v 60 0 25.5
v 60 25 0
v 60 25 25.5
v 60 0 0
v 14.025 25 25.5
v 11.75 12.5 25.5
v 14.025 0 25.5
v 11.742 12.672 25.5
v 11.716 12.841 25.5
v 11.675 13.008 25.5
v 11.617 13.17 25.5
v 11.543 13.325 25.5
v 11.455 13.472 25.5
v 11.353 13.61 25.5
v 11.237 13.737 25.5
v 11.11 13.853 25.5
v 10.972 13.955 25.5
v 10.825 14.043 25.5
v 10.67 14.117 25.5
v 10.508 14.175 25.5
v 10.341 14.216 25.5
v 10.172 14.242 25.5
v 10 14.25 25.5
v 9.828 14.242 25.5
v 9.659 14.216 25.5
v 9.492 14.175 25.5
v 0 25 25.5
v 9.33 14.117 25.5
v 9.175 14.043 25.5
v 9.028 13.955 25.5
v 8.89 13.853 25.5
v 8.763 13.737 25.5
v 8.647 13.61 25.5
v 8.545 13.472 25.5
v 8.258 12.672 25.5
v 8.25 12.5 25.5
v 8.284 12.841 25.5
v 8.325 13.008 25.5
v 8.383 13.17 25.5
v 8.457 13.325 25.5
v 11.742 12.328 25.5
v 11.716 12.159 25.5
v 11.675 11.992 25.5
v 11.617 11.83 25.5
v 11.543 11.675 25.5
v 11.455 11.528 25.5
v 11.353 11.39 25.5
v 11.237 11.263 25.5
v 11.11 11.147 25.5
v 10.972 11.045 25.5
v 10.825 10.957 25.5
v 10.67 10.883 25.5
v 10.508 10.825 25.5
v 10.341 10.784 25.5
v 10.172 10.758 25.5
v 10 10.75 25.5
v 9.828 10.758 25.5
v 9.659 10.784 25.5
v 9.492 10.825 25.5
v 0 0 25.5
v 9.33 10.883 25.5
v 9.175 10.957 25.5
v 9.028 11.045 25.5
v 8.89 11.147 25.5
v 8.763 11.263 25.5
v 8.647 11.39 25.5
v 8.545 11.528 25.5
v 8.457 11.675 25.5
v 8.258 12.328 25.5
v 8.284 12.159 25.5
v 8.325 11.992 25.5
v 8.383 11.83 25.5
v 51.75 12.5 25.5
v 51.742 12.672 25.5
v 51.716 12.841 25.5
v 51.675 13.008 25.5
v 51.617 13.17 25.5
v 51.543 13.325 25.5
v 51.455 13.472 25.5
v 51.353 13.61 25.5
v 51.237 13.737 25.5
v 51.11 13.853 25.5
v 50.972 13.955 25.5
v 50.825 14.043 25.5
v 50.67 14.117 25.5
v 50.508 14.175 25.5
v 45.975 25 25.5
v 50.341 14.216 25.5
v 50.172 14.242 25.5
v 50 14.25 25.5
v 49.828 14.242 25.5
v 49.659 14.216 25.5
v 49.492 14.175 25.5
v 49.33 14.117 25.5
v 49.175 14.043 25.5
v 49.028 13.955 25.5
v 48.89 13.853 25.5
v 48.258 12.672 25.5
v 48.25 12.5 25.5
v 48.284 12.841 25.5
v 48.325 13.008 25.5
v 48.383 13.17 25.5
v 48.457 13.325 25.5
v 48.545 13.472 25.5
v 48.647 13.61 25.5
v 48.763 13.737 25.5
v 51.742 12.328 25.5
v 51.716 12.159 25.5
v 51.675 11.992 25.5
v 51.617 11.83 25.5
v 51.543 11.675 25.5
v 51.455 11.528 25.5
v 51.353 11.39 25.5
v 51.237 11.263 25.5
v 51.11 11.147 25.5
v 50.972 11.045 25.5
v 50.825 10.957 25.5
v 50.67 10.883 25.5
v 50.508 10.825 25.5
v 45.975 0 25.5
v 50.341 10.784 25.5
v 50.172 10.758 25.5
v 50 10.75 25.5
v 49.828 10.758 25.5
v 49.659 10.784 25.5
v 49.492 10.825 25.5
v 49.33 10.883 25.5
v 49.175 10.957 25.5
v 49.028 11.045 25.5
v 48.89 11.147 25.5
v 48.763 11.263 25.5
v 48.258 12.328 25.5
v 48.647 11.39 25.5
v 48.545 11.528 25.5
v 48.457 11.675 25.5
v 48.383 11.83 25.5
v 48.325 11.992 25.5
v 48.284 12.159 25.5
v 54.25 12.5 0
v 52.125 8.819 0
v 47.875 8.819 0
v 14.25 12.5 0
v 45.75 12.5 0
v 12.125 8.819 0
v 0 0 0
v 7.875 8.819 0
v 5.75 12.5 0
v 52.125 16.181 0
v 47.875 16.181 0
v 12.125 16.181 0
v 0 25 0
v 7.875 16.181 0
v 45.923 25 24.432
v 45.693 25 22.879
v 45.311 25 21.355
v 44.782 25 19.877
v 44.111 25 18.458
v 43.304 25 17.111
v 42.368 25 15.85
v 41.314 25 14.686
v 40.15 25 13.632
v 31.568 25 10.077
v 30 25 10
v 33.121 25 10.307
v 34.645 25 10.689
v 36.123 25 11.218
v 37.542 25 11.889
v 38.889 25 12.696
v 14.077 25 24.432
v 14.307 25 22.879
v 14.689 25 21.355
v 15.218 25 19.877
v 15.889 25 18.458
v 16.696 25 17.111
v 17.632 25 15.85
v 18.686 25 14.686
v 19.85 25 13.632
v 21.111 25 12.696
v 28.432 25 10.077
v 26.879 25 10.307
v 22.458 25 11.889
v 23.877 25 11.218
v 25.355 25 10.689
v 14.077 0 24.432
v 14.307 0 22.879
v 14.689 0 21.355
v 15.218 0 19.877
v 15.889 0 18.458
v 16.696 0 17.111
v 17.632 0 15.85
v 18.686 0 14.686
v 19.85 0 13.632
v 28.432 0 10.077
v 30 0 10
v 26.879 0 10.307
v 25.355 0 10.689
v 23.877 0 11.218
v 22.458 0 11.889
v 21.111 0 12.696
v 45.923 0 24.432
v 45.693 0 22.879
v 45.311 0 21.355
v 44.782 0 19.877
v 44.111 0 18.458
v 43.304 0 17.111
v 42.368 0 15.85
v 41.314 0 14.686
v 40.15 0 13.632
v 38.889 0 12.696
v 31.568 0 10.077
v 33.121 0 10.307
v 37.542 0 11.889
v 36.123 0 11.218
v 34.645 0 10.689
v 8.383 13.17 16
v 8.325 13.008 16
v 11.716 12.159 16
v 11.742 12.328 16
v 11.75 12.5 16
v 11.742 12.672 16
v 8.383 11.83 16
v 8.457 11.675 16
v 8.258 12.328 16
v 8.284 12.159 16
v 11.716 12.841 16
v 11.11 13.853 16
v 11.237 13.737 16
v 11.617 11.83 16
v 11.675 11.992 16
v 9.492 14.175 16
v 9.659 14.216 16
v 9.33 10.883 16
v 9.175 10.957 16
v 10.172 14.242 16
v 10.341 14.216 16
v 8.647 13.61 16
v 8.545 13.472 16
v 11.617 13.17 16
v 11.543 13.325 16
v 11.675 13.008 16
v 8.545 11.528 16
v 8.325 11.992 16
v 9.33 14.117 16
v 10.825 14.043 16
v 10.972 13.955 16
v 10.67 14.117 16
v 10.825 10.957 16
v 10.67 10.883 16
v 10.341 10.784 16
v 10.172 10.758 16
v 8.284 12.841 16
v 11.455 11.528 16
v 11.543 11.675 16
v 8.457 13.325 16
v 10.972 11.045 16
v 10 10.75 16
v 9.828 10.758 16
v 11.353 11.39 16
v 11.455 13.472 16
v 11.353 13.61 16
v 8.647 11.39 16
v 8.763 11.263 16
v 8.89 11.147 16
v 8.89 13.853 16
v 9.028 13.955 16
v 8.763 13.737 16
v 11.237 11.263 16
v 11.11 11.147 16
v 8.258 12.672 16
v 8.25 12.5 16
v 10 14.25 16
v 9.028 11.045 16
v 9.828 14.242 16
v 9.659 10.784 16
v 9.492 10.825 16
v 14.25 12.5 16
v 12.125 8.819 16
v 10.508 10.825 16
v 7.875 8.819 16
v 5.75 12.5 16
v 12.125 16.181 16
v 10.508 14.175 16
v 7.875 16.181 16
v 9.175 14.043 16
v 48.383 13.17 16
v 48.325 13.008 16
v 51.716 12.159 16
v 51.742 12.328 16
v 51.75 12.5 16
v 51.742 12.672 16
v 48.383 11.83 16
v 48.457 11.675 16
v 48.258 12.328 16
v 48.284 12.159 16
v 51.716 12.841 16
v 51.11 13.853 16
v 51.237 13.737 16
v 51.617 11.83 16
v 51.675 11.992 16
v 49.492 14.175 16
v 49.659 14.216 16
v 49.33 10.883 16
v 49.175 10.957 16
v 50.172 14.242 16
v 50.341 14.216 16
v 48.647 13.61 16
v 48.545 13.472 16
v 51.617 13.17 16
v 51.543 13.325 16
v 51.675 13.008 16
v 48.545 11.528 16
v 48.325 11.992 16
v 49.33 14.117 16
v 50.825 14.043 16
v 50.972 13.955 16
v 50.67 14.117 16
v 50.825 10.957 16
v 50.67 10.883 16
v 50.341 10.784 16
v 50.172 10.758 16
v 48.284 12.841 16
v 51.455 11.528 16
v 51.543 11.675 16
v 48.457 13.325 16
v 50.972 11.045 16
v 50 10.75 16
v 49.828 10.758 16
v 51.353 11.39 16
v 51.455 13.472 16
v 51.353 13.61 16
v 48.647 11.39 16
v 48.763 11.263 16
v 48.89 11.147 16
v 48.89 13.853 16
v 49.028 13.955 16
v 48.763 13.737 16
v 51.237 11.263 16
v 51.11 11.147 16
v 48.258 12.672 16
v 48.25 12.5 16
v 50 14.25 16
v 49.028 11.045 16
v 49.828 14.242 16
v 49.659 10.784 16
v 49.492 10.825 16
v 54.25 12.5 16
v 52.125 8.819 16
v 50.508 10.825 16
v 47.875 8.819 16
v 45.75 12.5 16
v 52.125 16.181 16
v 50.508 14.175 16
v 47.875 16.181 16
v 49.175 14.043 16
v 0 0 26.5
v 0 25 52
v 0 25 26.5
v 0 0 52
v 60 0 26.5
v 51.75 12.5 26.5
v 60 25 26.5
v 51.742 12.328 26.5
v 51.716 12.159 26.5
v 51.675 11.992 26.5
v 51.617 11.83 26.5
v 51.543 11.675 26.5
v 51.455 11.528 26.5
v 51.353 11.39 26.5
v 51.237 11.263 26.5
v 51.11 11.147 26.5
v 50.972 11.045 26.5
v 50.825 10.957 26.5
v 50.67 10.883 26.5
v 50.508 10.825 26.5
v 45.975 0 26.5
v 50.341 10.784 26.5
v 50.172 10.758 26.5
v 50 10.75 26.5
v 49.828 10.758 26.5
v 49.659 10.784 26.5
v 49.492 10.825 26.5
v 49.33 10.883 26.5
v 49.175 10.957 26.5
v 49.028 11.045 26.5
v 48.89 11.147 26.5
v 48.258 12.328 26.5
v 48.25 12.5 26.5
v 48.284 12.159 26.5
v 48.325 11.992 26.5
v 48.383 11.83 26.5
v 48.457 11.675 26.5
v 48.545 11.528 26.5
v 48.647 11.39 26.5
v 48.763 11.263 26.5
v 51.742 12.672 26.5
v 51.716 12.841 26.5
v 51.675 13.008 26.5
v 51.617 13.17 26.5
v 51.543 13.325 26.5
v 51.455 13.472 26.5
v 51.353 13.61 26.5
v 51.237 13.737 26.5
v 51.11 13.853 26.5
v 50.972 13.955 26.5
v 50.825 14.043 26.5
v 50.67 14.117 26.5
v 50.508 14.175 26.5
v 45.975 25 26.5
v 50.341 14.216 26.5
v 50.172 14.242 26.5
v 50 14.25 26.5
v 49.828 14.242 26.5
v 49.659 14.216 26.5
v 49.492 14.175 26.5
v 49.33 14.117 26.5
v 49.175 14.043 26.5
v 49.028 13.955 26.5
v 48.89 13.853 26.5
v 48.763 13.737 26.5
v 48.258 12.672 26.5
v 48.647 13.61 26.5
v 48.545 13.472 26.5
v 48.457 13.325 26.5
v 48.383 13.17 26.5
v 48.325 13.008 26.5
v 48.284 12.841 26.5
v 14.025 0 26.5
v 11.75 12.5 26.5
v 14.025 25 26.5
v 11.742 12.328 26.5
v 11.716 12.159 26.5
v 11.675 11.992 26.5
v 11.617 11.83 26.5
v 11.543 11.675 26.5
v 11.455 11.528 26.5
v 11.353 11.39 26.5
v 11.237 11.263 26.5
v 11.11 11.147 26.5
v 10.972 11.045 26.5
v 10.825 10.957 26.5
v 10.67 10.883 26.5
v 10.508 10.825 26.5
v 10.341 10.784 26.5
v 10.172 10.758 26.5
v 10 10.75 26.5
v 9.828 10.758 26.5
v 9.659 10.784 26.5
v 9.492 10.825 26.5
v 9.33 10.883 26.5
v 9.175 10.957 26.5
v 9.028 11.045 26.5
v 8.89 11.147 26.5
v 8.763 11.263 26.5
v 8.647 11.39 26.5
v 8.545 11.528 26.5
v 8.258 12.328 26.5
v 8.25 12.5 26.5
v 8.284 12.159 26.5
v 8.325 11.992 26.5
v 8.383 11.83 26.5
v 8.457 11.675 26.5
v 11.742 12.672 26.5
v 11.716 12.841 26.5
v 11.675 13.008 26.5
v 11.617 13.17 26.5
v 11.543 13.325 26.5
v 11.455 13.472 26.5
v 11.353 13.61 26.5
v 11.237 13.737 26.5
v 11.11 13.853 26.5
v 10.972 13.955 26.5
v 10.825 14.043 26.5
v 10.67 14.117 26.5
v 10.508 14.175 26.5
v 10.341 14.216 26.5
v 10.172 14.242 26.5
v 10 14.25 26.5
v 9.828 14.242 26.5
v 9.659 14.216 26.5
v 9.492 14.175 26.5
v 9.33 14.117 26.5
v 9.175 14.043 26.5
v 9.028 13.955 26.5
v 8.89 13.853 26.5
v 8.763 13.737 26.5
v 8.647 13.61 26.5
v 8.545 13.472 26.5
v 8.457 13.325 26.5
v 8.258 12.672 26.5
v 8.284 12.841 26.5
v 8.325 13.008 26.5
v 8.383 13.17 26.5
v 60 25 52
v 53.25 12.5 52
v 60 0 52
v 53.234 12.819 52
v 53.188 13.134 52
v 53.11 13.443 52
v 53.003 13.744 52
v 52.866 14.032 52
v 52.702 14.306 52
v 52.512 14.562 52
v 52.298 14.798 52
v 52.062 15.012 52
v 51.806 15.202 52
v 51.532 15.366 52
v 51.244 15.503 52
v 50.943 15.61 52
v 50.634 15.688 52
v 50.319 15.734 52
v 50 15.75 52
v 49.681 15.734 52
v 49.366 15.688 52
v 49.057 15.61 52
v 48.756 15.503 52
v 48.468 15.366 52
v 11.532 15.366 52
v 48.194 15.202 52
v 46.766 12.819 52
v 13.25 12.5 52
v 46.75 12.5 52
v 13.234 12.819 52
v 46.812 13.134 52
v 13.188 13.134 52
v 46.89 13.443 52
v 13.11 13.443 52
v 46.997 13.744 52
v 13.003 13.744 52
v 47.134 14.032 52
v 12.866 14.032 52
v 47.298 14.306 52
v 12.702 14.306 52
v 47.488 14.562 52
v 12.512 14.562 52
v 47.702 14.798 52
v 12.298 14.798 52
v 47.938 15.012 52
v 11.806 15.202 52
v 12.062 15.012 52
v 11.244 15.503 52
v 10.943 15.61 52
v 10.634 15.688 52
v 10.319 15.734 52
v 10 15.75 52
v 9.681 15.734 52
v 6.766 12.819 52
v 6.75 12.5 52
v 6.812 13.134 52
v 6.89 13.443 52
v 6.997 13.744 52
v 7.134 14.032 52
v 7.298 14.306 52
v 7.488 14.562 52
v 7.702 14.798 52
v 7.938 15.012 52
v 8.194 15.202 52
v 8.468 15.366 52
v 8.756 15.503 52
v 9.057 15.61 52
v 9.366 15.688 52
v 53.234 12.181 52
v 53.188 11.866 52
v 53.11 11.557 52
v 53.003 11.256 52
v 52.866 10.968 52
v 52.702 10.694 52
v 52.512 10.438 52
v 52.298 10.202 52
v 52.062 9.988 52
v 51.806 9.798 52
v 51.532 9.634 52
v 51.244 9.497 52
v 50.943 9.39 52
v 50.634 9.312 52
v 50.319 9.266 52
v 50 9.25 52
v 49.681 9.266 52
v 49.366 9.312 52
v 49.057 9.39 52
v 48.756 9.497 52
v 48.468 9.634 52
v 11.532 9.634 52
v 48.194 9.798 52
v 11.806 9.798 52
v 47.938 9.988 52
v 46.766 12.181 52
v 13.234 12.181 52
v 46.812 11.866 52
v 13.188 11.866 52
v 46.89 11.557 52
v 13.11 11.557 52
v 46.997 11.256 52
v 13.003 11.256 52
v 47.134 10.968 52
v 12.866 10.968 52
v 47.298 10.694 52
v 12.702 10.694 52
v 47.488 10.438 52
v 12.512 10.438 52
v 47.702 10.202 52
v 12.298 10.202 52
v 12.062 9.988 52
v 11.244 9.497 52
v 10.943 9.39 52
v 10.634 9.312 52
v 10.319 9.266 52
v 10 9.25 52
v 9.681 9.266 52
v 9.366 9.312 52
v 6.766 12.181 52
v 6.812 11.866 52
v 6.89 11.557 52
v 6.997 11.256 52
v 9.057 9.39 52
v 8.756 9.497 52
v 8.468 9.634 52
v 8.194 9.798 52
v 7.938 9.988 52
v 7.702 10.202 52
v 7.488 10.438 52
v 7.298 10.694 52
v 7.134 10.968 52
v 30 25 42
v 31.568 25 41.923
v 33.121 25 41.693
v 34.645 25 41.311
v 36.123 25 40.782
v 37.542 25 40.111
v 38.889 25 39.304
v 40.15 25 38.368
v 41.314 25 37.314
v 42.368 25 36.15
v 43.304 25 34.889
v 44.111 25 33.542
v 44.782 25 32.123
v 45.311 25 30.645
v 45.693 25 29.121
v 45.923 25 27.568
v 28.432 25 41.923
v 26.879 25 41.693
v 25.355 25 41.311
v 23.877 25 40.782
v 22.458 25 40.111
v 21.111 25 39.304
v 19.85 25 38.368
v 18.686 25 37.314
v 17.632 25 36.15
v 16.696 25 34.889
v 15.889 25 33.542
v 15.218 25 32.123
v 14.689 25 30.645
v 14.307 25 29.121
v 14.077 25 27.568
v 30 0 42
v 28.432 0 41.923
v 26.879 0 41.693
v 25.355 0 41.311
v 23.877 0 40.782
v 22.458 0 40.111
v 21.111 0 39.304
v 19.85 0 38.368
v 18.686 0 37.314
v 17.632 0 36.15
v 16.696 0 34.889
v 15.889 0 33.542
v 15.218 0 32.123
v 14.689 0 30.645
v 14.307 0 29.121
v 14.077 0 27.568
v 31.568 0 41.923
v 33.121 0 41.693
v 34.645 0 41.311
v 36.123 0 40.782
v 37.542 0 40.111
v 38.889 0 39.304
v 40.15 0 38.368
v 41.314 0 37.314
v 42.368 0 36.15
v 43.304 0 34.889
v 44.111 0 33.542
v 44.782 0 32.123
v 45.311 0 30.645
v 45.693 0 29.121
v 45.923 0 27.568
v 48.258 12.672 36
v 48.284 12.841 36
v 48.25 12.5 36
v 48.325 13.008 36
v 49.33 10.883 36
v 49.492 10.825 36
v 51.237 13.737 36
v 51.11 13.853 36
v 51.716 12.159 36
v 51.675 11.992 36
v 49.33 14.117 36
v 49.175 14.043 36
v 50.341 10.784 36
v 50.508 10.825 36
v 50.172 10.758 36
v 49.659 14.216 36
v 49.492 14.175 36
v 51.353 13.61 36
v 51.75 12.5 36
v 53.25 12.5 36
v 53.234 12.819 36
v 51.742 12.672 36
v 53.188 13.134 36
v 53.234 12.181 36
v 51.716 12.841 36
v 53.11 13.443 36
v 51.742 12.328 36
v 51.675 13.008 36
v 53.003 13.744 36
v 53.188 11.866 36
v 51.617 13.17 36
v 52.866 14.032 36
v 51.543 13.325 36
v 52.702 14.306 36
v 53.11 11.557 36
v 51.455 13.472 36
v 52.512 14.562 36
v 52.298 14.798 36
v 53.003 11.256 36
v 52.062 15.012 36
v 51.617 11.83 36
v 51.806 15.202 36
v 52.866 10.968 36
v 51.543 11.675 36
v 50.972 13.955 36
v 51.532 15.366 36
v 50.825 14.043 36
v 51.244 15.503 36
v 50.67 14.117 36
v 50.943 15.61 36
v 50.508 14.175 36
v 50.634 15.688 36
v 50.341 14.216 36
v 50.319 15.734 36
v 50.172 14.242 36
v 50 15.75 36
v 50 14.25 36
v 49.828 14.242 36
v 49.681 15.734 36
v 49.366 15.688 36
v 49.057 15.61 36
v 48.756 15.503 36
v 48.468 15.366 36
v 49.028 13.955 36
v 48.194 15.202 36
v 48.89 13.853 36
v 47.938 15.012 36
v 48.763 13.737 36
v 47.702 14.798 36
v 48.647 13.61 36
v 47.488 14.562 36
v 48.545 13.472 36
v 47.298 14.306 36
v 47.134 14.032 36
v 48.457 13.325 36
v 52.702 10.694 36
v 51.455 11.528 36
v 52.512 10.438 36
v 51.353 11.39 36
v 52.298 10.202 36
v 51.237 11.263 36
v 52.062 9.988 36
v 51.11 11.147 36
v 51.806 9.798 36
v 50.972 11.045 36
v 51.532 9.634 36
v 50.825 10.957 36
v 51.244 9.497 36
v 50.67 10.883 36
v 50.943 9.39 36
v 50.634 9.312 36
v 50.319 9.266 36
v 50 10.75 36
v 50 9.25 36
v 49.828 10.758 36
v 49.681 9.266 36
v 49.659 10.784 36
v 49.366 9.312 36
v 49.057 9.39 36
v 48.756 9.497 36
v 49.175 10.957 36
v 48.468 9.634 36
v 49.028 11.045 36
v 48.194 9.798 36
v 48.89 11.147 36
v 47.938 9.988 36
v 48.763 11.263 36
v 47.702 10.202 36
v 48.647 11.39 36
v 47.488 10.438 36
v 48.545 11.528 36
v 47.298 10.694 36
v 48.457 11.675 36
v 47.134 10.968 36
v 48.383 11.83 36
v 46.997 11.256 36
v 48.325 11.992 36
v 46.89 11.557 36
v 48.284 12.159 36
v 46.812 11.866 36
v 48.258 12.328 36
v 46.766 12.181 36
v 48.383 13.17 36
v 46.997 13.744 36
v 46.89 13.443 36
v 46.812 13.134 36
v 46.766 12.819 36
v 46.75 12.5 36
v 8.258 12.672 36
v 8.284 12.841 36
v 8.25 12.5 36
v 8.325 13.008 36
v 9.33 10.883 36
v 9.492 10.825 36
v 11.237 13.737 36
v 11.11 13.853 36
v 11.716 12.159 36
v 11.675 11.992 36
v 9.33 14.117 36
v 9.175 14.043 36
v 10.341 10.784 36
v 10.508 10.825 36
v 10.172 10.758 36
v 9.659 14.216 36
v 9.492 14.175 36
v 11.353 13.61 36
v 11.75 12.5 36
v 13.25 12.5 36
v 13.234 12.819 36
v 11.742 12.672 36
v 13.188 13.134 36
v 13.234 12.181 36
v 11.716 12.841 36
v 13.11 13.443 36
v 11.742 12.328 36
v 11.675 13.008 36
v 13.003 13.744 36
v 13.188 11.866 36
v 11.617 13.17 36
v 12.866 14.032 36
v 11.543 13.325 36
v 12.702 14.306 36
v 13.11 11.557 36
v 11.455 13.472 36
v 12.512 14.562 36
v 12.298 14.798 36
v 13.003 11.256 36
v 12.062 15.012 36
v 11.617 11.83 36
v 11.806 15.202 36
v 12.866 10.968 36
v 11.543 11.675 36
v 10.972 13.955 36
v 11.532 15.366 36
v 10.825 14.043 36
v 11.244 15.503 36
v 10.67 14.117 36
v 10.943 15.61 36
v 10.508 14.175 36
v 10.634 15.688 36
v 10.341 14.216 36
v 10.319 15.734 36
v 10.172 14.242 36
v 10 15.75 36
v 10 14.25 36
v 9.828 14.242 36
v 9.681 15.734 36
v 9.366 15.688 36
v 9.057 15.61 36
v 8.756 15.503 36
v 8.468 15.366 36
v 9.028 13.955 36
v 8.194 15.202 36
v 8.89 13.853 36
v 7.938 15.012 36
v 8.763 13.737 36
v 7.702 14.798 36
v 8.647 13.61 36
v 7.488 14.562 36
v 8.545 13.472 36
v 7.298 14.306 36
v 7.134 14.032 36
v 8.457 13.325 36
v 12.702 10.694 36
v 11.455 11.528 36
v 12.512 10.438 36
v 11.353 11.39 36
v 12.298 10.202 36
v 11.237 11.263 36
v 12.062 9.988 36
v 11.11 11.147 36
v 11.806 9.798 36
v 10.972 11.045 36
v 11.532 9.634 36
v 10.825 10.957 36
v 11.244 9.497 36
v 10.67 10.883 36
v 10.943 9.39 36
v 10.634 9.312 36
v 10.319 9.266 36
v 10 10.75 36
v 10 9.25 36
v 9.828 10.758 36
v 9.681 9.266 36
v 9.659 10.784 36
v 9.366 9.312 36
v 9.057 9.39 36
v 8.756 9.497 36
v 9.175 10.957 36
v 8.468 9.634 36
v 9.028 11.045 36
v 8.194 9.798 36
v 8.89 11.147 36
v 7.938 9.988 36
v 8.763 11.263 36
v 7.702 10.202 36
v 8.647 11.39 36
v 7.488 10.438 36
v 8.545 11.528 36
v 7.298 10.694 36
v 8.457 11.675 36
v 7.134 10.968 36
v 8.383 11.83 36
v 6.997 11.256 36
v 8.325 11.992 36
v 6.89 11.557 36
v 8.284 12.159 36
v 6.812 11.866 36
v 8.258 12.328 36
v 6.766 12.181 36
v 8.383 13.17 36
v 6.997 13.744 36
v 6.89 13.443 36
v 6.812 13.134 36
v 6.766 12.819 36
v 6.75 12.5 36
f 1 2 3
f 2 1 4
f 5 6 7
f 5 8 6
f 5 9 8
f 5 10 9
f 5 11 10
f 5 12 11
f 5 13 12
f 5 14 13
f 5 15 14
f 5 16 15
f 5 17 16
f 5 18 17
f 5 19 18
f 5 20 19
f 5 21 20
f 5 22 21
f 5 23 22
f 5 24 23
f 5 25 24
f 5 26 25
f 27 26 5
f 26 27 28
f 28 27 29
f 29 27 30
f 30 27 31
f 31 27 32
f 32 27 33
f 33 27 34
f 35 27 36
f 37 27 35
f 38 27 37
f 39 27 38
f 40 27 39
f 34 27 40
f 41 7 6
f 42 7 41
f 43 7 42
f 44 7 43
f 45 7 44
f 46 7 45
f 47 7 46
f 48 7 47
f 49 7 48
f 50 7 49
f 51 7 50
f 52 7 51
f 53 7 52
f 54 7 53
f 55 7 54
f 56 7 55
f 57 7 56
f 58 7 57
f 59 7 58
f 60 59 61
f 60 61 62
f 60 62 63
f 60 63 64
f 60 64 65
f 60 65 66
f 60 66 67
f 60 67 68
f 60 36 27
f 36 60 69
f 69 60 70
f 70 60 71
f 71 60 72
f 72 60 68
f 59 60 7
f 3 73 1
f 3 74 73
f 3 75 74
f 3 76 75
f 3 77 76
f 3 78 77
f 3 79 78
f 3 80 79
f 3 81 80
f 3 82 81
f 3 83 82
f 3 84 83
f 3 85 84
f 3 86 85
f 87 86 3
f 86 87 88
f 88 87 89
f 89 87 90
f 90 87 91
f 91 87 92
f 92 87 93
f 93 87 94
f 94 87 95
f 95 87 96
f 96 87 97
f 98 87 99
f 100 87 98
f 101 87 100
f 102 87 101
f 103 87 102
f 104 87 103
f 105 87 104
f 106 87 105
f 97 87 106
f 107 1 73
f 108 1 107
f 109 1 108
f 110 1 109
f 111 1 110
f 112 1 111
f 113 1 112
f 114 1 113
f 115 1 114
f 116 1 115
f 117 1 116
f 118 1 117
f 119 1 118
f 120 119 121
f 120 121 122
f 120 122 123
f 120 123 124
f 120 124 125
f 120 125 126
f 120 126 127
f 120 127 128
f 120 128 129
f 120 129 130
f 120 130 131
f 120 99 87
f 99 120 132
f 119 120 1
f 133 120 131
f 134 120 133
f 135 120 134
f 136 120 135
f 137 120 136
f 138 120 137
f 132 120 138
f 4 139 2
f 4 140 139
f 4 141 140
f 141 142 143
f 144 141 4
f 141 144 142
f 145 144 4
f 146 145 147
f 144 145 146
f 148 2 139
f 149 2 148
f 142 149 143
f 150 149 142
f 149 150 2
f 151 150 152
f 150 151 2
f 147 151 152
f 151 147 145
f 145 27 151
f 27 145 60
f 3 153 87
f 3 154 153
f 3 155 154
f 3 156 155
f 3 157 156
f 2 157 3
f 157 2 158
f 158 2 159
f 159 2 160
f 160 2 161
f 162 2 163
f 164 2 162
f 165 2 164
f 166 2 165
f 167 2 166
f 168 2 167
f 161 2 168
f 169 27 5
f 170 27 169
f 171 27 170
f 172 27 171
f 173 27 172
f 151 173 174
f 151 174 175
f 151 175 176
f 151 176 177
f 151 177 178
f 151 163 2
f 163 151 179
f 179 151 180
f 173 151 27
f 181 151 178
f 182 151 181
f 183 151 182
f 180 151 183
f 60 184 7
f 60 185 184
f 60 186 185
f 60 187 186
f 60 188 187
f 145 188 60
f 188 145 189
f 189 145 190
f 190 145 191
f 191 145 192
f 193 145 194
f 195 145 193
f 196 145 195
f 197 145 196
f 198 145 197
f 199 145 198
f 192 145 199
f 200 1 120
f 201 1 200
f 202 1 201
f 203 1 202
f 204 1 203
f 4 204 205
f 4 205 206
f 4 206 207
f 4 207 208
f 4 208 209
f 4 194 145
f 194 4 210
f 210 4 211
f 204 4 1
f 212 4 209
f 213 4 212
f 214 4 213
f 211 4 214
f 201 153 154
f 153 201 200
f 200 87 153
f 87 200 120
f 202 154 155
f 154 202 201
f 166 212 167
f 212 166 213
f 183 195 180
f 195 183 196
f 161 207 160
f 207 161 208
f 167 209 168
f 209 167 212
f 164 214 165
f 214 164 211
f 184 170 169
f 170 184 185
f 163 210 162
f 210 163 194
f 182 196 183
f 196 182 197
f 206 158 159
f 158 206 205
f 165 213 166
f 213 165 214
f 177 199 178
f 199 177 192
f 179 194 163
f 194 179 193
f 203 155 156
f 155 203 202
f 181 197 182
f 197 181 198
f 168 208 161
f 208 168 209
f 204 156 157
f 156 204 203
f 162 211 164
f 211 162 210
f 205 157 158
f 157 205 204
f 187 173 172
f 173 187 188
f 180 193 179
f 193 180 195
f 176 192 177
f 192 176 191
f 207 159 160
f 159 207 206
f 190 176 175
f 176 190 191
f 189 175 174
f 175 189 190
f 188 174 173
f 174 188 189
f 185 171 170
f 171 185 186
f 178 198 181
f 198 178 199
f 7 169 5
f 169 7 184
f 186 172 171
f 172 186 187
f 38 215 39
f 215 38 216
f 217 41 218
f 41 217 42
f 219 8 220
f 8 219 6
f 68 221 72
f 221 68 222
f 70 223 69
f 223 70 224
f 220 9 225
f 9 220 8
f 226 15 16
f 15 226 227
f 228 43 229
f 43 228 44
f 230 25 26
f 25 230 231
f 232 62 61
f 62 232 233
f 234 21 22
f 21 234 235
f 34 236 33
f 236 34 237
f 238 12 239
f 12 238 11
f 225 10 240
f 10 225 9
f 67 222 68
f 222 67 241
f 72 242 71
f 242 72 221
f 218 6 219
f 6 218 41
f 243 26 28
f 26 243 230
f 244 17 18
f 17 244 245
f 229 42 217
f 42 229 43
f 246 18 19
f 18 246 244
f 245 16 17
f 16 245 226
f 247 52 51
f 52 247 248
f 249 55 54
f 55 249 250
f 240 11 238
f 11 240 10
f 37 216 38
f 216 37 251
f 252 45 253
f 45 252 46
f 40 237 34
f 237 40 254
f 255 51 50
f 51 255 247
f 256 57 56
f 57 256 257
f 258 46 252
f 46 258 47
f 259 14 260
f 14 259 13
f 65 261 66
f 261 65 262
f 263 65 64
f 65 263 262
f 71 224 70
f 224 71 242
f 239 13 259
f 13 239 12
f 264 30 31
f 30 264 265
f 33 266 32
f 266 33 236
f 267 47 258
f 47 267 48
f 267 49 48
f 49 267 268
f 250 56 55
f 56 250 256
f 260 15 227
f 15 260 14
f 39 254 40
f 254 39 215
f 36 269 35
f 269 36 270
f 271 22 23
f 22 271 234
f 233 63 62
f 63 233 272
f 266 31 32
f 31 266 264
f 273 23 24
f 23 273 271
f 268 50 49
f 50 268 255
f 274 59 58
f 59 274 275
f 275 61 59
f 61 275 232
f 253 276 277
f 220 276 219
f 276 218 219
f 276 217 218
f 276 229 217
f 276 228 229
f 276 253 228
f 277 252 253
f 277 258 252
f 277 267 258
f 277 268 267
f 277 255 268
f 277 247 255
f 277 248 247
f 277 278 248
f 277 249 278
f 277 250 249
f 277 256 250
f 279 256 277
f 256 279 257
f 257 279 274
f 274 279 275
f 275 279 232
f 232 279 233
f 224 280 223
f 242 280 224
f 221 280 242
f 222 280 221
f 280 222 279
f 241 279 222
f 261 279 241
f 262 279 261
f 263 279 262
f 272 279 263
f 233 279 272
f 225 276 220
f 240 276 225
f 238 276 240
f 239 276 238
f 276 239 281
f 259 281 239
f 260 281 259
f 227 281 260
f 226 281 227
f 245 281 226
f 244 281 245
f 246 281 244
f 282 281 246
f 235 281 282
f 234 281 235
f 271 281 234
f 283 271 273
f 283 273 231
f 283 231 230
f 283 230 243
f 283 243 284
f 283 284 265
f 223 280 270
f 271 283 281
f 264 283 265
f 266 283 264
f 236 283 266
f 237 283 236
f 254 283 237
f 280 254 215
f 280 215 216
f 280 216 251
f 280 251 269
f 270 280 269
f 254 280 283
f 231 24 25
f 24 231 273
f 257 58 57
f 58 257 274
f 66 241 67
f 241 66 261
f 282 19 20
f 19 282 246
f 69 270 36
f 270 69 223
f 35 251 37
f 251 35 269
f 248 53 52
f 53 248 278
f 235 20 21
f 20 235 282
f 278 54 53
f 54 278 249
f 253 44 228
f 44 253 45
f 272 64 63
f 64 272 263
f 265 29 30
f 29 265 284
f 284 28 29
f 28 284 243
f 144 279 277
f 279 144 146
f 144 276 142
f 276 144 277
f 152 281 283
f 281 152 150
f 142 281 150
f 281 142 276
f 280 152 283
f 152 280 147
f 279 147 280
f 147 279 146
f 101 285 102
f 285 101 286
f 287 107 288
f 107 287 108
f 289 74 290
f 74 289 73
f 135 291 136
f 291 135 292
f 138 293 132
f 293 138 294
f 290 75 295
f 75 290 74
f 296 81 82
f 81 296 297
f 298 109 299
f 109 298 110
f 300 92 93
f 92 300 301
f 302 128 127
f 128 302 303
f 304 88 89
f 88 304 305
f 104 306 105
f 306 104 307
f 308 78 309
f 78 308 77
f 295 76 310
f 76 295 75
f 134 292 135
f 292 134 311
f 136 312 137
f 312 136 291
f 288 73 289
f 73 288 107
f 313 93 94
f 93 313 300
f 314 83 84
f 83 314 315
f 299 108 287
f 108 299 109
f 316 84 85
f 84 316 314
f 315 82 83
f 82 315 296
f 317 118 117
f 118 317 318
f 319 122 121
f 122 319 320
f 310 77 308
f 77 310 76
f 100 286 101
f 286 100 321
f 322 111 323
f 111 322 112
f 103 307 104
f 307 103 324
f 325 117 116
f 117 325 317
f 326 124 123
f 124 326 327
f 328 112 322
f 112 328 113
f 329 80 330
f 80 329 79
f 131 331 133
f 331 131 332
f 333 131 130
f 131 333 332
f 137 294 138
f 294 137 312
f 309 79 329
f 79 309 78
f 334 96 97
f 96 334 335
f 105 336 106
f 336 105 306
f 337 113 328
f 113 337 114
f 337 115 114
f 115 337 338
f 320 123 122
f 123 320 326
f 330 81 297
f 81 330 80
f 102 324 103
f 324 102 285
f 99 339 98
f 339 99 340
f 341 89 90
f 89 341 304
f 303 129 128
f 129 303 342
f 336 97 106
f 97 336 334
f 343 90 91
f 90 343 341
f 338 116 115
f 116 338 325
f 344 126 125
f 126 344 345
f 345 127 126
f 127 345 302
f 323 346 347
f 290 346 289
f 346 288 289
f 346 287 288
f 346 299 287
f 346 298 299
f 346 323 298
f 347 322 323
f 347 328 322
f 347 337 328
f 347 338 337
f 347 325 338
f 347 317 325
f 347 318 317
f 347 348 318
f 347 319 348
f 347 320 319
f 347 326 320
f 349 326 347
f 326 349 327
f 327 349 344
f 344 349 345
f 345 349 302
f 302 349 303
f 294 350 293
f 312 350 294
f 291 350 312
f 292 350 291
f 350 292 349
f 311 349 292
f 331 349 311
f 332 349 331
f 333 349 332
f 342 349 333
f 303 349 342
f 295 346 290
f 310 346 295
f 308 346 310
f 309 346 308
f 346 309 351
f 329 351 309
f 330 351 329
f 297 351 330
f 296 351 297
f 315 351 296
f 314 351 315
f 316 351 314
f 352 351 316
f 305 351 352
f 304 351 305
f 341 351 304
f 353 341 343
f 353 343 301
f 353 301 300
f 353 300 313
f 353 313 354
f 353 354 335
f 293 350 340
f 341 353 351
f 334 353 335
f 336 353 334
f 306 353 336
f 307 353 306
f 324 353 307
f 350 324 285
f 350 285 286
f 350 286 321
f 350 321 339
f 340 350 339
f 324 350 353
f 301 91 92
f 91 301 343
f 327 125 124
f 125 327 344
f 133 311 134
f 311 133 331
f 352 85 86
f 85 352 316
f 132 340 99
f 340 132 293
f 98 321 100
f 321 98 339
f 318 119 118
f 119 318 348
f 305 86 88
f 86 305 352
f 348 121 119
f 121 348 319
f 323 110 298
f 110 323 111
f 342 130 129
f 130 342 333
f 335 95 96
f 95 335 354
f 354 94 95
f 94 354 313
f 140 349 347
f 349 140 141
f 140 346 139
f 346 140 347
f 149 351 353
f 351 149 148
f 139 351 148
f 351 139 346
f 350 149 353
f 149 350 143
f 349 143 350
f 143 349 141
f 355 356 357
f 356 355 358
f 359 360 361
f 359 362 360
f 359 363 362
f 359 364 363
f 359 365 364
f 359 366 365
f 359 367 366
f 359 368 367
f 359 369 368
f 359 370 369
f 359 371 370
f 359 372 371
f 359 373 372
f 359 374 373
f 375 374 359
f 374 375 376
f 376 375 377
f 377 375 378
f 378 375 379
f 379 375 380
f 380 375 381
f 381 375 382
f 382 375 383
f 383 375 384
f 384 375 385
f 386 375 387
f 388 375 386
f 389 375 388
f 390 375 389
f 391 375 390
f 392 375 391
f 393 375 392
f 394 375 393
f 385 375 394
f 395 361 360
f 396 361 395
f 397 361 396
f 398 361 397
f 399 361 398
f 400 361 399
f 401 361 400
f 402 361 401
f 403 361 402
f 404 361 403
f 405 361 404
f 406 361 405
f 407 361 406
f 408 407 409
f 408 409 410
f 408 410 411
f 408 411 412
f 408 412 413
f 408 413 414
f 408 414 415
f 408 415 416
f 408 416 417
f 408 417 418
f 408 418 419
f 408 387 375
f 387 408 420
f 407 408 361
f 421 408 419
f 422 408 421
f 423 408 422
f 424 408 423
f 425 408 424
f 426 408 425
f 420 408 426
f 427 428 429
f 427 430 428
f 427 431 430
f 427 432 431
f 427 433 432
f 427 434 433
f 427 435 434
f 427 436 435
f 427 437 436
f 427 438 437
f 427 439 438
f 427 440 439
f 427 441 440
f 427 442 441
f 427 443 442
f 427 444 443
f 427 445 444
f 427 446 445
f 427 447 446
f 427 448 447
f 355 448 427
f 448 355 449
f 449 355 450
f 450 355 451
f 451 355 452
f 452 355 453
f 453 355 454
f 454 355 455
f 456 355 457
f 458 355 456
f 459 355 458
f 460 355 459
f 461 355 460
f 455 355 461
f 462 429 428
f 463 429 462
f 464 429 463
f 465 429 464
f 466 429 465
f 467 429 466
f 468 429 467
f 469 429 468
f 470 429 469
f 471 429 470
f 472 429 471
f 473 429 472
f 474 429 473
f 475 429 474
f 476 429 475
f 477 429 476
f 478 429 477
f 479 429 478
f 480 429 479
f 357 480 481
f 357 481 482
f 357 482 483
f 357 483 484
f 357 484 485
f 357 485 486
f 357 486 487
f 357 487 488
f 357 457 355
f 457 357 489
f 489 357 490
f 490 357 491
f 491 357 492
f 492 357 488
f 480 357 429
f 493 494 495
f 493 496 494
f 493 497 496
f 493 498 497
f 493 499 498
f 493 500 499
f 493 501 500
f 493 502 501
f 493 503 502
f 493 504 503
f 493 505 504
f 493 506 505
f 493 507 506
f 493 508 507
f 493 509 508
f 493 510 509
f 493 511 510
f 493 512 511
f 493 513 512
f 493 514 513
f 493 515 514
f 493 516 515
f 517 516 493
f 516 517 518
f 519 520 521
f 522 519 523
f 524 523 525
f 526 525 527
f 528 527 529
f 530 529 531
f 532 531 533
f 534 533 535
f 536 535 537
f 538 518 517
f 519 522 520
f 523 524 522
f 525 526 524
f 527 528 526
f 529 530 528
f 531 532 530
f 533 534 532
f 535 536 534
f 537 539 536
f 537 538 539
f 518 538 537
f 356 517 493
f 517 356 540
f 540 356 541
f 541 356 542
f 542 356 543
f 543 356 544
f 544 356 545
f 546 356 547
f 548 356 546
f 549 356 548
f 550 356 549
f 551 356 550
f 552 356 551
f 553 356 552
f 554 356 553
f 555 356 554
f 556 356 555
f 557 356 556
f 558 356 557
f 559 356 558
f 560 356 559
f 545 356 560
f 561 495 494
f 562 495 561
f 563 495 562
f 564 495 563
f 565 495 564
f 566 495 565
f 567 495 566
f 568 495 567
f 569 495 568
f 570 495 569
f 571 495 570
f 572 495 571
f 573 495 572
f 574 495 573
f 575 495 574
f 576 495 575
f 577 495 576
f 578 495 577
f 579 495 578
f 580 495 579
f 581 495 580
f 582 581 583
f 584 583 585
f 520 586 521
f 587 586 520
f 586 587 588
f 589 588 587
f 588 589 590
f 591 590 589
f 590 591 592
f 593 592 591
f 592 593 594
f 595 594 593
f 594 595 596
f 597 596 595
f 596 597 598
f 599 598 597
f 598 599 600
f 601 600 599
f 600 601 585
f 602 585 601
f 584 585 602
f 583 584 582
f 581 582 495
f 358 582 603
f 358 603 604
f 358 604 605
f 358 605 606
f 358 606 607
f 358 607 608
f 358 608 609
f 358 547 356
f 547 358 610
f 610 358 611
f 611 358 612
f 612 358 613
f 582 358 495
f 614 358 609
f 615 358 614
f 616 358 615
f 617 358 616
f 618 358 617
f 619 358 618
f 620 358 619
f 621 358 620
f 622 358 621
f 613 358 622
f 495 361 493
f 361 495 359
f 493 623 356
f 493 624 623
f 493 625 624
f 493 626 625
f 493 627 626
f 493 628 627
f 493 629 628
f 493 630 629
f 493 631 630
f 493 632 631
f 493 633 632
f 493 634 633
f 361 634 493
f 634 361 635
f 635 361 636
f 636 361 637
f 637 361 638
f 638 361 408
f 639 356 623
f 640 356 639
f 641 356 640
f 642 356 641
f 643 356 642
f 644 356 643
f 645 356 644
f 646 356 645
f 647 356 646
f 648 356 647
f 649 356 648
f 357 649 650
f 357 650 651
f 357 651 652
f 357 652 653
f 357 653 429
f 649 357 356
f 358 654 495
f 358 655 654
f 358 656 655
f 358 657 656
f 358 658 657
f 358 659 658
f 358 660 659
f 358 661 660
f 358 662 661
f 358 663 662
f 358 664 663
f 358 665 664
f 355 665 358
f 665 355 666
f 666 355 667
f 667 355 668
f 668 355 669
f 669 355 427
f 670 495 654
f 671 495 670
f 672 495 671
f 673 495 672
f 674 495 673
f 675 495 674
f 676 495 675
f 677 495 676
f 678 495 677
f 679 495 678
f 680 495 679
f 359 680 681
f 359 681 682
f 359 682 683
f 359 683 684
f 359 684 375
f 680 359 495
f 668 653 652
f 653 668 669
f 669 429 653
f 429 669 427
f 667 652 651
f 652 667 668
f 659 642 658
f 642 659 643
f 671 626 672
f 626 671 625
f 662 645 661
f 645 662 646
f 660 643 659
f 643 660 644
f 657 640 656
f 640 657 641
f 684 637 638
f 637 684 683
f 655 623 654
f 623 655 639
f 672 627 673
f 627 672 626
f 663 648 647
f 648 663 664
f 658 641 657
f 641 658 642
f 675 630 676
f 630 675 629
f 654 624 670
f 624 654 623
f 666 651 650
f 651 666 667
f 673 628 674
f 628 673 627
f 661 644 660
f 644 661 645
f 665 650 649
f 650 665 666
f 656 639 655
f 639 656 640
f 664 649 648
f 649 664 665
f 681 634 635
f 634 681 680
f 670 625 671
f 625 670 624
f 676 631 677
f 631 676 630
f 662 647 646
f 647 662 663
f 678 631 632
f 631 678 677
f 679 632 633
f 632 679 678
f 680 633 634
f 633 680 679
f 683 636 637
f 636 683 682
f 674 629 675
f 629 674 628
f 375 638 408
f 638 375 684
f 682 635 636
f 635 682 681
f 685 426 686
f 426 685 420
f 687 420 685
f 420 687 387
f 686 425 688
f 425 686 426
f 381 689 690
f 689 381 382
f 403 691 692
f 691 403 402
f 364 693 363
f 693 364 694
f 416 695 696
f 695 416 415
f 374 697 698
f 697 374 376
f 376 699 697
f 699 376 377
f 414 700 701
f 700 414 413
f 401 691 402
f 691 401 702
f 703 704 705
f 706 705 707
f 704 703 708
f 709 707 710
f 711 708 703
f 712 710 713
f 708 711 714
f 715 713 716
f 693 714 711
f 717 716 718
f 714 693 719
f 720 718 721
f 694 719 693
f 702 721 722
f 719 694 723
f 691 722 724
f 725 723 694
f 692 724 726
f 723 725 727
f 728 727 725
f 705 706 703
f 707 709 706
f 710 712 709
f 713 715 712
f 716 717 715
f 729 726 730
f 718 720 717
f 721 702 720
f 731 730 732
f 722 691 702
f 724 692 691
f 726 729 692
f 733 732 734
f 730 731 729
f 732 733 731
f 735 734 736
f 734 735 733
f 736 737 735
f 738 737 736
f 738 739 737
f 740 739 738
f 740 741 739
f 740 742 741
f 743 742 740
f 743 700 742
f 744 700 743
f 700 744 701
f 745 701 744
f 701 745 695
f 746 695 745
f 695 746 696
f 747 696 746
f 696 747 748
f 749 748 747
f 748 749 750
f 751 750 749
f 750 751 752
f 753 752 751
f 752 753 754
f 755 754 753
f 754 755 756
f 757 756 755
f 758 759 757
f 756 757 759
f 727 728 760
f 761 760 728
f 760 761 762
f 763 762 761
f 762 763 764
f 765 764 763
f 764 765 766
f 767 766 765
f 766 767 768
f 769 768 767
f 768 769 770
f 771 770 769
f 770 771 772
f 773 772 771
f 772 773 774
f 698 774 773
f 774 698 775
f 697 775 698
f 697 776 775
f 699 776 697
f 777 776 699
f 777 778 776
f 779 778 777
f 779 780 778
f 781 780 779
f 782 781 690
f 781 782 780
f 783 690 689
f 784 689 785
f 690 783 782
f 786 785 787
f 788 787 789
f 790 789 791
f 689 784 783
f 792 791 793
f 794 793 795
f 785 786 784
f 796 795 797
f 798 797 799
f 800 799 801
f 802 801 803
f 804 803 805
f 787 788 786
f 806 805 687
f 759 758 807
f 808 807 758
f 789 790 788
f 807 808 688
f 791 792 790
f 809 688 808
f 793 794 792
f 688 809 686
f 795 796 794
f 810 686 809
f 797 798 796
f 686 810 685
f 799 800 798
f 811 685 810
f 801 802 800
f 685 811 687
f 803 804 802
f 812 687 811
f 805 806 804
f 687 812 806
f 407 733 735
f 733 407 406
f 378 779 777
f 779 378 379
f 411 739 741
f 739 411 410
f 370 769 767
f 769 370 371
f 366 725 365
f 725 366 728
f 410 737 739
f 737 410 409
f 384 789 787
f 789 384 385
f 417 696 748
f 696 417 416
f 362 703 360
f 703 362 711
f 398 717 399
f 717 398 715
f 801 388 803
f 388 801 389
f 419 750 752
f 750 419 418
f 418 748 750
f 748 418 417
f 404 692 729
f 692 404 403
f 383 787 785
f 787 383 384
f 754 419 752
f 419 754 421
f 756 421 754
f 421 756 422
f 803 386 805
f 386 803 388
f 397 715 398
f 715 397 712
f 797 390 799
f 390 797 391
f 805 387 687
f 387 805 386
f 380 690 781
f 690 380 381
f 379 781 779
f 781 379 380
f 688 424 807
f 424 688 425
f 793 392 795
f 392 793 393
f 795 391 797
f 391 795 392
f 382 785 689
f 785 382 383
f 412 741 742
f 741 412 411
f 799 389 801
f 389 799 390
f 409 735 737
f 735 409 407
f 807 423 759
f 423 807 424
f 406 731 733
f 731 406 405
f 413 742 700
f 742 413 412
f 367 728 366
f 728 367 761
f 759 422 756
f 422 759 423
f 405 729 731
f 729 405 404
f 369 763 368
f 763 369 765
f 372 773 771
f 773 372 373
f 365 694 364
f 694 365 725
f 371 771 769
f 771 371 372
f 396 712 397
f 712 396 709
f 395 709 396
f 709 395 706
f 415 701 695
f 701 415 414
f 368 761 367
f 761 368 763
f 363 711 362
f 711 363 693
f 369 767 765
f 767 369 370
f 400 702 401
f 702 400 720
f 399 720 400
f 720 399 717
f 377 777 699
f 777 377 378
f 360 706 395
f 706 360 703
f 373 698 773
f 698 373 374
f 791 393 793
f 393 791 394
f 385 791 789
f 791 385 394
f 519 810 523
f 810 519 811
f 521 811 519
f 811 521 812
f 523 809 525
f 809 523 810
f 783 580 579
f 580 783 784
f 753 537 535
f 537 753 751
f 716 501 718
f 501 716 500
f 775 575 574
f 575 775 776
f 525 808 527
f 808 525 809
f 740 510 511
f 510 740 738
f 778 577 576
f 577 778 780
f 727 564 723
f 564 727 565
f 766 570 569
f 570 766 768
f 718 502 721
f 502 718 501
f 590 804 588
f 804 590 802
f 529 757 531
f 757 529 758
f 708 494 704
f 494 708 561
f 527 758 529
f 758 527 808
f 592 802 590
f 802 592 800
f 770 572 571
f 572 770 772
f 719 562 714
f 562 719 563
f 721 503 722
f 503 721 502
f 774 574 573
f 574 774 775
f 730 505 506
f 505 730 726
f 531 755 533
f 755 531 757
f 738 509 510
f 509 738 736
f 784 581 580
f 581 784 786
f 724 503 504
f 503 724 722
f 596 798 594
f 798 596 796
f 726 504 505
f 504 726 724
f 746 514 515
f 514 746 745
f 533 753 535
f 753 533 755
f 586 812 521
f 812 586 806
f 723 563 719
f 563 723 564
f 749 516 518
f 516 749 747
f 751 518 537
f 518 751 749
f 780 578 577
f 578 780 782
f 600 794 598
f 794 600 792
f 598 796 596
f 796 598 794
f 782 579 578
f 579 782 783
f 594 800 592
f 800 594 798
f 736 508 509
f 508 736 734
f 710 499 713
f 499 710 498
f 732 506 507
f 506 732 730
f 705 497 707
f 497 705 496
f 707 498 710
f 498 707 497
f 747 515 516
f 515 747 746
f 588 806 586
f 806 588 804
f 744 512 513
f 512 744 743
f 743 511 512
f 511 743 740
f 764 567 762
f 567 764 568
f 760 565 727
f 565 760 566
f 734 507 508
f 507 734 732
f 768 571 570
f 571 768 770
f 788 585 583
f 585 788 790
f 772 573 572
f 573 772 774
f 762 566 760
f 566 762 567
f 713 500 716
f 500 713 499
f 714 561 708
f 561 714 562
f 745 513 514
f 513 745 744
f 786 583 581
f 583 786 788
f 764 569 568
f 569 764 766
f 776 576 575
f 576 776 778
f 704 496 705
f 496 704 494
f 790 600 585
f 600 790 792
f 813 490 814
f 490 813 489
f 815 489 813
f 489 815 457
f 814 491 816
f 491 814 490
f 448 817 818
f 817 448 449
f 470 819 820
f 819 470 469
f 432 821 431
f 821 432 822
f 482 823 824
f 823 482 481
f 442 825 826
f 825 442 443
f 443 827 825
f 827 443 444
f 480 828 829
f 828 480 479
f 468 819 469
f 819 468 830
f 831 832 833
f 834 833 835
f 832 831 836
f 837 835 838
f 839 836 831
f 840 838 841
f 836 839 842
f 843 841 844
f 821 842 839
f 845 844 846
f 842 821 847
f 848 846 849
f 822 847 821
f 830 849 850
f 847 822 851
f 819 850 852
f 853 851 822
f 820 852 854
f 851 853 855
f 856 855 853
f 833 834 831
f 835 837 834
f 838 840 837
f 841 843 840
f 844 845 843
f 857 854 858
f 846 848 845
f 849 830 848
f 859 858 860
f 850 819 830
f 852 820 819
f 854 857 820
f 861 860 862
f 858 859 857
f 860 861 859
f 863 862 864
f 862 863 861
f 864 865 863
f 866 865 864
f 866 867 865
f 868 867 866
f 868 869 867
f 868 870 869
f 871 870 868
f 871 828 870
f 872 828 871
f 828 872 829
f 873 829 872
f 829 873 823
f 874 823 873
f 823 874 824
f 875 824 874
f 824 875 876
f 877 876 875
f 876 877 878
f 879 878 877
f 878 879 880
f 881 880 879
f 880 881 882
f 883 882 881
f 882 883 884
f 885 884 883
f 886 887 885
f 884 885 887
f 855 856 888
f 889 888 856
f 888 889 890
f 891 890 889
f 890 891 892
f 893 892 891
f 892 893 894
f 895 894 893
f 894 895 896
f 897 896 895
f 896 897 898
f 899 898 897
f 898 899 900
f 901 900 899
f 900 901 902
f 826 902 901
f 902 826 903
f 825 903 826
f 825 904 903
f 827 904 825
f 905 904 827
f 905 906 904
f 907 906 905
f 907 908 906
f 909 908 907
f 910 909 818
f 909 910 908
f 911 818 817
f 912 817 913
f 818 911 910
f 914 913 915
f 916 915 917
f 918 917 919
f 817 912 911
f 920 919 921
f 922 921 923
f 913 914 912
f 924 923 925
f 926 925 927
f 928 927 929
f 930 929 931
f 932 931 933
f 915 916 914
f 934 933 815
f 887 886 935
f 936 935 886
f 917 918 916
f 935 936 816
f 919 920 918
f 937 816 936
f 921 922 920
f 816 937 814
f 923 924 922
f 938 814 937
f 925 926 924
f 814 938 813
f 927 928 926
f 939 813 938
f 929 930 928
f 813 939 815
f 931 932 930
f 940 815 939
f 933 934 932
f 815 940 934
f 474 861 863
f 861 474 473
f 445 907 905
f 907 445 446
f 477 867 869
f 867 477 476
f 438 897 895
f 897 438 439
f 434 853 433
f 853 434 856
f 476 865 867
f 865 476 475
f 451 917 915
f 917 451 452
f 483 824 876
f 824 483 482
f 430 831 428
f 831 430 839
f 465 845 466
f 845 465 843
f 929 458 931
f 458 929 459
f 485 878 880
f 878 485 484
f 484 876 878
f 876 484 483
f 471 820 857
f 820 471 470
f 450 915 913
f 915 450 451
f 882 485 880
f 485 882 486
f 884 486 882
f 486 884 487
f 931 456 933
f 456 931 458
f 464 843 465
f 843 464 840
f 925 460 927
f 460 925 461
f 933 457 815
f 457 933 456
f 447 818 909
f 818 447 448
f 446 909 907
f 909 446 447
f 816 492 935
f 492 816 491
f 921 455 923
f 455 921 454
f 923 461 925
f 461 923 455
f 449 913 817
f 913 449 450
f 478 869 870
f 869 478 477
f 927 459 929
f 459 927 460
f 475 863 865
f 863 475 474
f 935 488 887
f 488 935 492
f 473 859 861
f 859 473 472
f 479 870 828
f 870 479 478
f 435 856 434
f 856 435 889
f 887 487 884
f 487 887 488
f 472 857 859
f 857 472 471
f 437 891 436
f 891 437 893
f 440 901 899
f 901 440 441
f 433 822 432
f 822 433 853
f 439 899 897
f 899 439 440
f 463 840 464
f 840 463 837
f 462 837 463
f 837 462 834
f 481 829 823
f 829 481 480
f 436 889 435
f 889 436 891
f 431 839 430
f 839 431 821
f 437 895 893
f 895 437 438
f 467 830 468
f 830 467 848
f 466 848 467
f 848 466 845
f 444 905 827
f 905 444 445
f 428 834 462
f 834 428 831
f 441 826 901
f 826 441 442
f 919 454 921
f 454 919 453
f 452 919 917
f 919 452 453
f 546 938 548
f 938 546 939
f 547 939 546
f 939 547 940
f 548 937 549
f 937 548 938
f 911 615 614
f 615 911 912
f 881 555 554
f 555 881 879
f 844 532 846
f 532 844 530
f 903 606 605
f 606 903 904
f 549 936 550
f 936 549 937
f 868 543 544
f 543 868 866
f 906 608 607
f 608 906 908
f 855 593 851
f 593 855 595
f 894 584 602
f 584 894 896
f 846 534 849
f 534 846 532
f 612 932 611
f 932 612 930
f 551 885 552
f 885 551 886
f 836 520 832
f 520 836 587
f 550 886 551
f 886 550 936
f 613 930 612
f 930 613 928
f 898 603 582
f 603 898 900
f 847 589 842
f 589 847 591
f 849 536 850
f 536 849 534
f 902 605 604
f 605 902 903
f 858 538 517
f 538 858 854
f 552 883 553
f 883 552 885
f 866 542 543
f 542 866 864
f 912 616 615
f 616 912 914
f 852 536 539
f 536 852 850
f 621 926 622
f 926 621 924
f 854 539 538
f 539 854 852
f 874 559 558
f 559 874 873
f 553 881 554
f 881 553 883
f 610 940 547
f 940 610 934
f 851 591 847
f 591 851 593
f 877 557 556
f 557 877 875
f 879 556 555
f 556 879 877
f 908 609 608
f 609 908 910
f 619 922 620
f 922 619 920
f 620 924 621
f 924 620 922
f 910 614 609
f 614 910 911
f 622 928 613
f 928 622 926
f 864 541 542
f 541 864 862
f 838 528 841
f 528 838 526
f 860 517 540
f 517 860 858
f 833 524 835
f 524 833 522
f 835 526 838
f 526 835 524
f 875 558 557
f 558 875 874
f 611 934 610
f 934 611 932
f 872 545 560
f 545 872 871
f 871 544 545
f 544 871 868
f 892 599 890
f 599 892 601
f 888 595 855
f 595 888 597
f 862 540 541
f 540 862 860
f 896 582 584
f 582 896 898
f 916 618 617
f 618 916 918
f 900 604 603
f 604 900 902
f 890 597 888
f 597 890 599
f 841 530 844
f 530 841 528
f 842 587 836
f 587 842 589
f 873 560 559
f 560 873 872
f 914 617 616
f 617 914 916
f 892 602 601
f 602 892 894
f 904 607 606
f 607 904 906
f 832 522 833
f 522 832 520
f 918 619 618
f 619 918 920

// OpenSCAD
module raw_motor_support(width,depth,clearance,motorDiameter) {
	height = motorDiameter/2+clearance-0.5;
	difference() {
		cube([width,depth,height]);
		translate([width/2,0,motorDiameter/2+clearance]) {
			rotate([-90,0,0]) {
				$fn=64;
				cylinder(h=depth,d=motorDiameter);
			}
		}
	}
}

module nut_mount(nutDiameter,boltHeadDiameter,boltLength,boltDepth) {
	translate($fn=64,[0,0,boltDepth]) cylinder(boltLength, d=nutDiameter);
	cylinder($fn=6,boltDepth, d=boltHeadDiameter);
}

module bolt_mount(boltDiameter,boltHeadDiameter,boltLength,boltDepth) {
	$fn=64;
	translate([0,0,boltDepth]) cylinder(boltLength, d=boltDiameter);
	cylinder(boltDepth, d=boltHeadDiameter);
}

module upper_support() {
	difference() {
		raw_motor_support(width,depth,clearance,motorDiameter);
		translate([10,depth/2,0]) bolt_mount(boltDiameter+0.5,boltHeadDiameter+0.5,boltLength,boltDepth);
		translate([width-10,depth/2,0]) bolt_mount(boltDiameter+0.5,boltHeadDiameter+0.5,boltLength,boltDepth);
	}
}

module lower_support() {
	difference() {
		raw_motor_support(width,depth,clearance,motorDiameter);
		translate([10,depth/2,0]) nut_mount(boltDiameter+0.5,nutDiameter+0.5,boltLength,boltDepth);
		translate([width-10,depth/2,0]) nut_mount(boltDiameter+0.5,nutDiameter+0.5,boltLength,boltDepth);
	}
}

width=60;
depth=25;
clearance=10;
motorDiameter=32;
boltDiameter=3;
boltHeadDiameter=6;
nutDiameter=8;
boltLength=10;
boltDepth=motorDiameter/2+clearance-boltLength;

lower_support();
translate([width,0,motorDiameter +2*clearance]) rotate([0,180,0]) upper_support();

// difference(){
// 	translate([-2*clearance,-2*clearance,-clearance]) {
// 		cube([width+4*clearance,depth+4*clearance,clearance]);
// 	}
// }
